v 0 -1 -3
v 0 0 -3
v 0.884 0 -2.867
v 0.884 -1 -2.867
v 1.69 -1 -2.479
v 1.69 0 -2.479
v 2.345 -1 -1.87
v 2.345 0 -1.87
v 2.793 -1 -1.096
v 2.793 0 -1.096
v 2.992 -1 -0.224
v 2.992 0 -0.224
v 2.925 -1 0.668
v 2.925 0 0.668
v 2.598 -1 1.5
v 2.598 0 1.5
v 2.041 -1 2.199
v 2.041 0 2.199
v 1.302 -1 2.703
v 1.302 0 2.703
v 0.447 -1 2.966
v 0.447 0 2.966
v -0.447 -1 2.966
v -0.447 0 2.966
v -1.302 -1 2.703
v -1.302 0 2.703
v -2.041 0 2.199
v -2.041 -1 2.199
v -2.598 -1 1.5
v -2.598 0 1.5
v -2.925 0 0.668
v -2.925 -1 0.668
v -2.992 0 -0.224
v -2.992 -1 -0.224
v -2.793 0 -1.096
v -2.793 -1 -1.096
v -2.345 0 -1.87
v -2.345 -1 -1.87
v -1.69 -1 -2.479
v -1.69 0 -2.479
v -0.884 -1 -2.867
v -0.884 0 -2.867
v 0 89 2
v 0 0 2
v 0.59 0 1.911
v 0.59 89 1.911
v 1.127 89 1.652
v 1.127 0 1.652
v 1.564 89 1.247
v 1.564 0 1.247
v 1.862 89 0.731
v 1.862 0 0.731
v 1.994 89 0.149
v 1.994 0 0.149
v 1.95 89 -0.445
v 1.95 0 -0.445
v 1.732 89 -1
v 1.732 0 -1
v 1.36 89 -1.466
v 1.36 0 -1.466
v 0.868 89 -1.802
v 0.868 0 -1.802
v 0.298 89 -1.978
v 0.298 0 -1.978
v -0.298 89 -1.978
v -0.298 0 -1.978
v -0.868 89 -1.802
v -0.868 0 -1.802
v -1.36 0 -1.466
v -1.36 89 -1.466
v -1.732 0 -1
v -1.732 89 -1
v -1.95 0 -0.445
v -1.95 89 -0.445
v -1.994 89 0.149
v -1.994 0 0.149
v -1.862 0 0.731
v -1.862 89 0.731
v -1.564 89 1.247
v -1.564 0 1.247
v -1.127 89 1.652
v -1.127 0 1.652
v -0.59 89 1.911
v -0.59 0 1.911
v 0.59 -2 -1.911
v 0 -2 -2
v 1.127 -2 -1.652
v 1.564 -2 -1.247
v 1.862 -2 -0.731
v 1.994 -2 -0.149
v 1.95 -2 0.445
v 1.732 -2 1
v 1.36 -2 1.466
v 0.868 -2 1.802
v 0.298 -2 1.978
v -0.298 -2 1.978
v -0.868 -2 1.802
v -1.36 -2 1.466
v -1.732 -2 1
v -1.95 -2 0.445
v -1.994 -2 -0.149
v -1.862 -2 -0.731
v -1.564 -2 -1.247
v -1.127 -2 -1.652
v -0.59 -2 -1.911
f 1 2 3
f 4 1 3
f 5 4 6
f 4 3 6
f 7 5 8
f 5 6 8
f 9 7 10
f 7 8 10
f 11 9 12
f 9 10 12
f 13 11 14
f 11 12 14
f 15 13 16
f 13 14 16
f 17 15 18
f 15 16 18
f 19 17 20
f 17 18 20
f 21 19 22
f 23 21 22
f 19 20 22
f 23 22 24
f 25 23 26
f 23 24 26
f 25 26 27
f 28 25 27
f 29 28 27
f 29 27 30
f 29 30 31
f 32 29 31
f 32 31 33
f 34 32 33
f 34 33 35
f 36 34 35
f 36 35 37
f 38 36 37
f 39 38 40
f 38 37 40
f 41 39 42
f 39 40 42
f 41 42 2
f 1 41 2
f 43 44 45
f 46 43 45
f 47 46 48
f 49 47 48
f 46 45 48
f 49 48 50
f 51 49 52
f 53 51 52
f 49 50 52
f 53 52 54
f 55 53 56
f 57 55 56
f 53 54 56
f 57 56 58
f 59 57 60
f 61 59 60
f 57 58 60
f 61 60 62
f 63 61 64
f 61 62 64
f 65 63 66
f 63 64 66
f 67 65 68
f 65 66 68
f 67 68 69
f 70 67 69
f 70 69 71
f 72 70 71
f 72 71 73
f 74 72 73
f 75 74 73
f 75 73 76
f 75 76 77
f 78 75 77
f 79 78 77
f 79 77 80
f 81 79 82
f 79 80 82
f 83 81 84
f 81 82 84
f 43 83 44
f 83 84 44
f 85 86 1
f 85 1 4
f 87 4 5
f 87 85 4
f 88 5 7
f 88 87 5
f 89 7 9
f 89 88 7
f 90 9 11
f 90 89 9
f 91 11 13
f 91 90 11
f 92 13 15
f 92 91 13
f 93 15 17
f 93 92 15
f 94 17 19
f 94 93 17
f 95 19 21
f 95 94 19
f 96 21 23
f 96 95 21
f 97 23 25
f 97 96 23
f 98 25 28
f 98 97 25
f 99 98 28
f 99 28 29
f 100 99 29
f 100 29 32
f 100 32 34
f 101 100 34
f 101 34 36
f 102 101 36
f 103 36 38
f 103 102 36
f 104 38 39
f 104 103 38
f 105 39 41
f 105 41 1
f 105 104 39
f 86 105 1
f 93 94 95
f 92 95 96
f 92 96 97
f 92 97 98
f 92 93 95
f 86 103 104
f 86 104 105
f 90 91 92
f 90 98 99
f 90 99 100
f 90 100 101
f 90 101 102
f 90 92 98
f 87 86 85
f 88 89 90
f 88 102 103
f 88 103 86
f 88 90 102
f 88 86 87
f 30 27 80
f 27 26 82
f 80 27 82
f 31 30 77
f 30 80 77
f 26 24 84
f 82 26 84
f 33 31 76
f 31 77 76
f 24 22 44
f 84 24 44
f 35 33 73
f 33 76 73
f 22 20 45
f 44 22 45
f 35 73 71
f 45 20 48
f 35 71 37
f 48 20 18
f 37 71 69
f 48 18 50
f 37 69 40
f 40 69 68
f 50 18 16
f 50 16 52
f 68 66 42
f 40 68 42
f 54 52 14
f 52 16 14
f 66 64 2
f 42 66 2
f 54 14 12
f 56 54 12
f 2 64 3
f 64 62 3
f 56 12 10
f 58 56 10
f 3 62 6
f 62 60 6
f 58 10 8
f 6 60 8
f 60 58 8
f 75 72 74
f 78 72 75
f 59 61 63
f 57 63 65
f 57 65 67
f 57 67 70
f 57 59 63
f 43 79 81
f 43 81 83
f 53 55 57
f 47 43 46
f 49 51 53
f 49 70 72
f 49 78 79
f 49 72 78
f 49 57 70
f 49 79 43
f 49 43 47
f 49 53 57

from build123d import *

# Parameters (mm, degrees)
SKETCH1_R           = 2
BOSS_EXTRUDE1_DEPTH = 89
SKETCH2_R           = 3
BOSS_EXTRUDE2_DEPTH = 2
CHAMFER1_SIZE       = 1


with BuildPart() as part:
    # Sketch1 → Boss-Extrude1 (new body)
    with BuildSketch(Plane(origin=(0, 0, 0), x_dir=(1, 0, 0), z_dir=(0, 1, 0))):
        with Locations(Location((0, 0, 0), (0, 0, 270))):
            Circle(SKETCH1_R)
    extrude(amount=BOSS_EXTRUDE1_DEPTH)

    # Sketch2 → Boss-Extrude2 (add)
    with BuildSketch(Plane.XZ):
        with Locations(Location((0, 0, 0), (0, 0, 270))):
            Circle(SKETCH2_R)
    extrude(amount=BOSS_EXTRUDE2_DEPTH)

    # Chamfer1
    chamfer1_edges = [part.edges().sort_by_distance(p)[0] for p in [
        (0, -2, 3),
    ]]
    chamfer(chamfer1_edges, length=CHAMFER1_SIZE)


solid = part.part
